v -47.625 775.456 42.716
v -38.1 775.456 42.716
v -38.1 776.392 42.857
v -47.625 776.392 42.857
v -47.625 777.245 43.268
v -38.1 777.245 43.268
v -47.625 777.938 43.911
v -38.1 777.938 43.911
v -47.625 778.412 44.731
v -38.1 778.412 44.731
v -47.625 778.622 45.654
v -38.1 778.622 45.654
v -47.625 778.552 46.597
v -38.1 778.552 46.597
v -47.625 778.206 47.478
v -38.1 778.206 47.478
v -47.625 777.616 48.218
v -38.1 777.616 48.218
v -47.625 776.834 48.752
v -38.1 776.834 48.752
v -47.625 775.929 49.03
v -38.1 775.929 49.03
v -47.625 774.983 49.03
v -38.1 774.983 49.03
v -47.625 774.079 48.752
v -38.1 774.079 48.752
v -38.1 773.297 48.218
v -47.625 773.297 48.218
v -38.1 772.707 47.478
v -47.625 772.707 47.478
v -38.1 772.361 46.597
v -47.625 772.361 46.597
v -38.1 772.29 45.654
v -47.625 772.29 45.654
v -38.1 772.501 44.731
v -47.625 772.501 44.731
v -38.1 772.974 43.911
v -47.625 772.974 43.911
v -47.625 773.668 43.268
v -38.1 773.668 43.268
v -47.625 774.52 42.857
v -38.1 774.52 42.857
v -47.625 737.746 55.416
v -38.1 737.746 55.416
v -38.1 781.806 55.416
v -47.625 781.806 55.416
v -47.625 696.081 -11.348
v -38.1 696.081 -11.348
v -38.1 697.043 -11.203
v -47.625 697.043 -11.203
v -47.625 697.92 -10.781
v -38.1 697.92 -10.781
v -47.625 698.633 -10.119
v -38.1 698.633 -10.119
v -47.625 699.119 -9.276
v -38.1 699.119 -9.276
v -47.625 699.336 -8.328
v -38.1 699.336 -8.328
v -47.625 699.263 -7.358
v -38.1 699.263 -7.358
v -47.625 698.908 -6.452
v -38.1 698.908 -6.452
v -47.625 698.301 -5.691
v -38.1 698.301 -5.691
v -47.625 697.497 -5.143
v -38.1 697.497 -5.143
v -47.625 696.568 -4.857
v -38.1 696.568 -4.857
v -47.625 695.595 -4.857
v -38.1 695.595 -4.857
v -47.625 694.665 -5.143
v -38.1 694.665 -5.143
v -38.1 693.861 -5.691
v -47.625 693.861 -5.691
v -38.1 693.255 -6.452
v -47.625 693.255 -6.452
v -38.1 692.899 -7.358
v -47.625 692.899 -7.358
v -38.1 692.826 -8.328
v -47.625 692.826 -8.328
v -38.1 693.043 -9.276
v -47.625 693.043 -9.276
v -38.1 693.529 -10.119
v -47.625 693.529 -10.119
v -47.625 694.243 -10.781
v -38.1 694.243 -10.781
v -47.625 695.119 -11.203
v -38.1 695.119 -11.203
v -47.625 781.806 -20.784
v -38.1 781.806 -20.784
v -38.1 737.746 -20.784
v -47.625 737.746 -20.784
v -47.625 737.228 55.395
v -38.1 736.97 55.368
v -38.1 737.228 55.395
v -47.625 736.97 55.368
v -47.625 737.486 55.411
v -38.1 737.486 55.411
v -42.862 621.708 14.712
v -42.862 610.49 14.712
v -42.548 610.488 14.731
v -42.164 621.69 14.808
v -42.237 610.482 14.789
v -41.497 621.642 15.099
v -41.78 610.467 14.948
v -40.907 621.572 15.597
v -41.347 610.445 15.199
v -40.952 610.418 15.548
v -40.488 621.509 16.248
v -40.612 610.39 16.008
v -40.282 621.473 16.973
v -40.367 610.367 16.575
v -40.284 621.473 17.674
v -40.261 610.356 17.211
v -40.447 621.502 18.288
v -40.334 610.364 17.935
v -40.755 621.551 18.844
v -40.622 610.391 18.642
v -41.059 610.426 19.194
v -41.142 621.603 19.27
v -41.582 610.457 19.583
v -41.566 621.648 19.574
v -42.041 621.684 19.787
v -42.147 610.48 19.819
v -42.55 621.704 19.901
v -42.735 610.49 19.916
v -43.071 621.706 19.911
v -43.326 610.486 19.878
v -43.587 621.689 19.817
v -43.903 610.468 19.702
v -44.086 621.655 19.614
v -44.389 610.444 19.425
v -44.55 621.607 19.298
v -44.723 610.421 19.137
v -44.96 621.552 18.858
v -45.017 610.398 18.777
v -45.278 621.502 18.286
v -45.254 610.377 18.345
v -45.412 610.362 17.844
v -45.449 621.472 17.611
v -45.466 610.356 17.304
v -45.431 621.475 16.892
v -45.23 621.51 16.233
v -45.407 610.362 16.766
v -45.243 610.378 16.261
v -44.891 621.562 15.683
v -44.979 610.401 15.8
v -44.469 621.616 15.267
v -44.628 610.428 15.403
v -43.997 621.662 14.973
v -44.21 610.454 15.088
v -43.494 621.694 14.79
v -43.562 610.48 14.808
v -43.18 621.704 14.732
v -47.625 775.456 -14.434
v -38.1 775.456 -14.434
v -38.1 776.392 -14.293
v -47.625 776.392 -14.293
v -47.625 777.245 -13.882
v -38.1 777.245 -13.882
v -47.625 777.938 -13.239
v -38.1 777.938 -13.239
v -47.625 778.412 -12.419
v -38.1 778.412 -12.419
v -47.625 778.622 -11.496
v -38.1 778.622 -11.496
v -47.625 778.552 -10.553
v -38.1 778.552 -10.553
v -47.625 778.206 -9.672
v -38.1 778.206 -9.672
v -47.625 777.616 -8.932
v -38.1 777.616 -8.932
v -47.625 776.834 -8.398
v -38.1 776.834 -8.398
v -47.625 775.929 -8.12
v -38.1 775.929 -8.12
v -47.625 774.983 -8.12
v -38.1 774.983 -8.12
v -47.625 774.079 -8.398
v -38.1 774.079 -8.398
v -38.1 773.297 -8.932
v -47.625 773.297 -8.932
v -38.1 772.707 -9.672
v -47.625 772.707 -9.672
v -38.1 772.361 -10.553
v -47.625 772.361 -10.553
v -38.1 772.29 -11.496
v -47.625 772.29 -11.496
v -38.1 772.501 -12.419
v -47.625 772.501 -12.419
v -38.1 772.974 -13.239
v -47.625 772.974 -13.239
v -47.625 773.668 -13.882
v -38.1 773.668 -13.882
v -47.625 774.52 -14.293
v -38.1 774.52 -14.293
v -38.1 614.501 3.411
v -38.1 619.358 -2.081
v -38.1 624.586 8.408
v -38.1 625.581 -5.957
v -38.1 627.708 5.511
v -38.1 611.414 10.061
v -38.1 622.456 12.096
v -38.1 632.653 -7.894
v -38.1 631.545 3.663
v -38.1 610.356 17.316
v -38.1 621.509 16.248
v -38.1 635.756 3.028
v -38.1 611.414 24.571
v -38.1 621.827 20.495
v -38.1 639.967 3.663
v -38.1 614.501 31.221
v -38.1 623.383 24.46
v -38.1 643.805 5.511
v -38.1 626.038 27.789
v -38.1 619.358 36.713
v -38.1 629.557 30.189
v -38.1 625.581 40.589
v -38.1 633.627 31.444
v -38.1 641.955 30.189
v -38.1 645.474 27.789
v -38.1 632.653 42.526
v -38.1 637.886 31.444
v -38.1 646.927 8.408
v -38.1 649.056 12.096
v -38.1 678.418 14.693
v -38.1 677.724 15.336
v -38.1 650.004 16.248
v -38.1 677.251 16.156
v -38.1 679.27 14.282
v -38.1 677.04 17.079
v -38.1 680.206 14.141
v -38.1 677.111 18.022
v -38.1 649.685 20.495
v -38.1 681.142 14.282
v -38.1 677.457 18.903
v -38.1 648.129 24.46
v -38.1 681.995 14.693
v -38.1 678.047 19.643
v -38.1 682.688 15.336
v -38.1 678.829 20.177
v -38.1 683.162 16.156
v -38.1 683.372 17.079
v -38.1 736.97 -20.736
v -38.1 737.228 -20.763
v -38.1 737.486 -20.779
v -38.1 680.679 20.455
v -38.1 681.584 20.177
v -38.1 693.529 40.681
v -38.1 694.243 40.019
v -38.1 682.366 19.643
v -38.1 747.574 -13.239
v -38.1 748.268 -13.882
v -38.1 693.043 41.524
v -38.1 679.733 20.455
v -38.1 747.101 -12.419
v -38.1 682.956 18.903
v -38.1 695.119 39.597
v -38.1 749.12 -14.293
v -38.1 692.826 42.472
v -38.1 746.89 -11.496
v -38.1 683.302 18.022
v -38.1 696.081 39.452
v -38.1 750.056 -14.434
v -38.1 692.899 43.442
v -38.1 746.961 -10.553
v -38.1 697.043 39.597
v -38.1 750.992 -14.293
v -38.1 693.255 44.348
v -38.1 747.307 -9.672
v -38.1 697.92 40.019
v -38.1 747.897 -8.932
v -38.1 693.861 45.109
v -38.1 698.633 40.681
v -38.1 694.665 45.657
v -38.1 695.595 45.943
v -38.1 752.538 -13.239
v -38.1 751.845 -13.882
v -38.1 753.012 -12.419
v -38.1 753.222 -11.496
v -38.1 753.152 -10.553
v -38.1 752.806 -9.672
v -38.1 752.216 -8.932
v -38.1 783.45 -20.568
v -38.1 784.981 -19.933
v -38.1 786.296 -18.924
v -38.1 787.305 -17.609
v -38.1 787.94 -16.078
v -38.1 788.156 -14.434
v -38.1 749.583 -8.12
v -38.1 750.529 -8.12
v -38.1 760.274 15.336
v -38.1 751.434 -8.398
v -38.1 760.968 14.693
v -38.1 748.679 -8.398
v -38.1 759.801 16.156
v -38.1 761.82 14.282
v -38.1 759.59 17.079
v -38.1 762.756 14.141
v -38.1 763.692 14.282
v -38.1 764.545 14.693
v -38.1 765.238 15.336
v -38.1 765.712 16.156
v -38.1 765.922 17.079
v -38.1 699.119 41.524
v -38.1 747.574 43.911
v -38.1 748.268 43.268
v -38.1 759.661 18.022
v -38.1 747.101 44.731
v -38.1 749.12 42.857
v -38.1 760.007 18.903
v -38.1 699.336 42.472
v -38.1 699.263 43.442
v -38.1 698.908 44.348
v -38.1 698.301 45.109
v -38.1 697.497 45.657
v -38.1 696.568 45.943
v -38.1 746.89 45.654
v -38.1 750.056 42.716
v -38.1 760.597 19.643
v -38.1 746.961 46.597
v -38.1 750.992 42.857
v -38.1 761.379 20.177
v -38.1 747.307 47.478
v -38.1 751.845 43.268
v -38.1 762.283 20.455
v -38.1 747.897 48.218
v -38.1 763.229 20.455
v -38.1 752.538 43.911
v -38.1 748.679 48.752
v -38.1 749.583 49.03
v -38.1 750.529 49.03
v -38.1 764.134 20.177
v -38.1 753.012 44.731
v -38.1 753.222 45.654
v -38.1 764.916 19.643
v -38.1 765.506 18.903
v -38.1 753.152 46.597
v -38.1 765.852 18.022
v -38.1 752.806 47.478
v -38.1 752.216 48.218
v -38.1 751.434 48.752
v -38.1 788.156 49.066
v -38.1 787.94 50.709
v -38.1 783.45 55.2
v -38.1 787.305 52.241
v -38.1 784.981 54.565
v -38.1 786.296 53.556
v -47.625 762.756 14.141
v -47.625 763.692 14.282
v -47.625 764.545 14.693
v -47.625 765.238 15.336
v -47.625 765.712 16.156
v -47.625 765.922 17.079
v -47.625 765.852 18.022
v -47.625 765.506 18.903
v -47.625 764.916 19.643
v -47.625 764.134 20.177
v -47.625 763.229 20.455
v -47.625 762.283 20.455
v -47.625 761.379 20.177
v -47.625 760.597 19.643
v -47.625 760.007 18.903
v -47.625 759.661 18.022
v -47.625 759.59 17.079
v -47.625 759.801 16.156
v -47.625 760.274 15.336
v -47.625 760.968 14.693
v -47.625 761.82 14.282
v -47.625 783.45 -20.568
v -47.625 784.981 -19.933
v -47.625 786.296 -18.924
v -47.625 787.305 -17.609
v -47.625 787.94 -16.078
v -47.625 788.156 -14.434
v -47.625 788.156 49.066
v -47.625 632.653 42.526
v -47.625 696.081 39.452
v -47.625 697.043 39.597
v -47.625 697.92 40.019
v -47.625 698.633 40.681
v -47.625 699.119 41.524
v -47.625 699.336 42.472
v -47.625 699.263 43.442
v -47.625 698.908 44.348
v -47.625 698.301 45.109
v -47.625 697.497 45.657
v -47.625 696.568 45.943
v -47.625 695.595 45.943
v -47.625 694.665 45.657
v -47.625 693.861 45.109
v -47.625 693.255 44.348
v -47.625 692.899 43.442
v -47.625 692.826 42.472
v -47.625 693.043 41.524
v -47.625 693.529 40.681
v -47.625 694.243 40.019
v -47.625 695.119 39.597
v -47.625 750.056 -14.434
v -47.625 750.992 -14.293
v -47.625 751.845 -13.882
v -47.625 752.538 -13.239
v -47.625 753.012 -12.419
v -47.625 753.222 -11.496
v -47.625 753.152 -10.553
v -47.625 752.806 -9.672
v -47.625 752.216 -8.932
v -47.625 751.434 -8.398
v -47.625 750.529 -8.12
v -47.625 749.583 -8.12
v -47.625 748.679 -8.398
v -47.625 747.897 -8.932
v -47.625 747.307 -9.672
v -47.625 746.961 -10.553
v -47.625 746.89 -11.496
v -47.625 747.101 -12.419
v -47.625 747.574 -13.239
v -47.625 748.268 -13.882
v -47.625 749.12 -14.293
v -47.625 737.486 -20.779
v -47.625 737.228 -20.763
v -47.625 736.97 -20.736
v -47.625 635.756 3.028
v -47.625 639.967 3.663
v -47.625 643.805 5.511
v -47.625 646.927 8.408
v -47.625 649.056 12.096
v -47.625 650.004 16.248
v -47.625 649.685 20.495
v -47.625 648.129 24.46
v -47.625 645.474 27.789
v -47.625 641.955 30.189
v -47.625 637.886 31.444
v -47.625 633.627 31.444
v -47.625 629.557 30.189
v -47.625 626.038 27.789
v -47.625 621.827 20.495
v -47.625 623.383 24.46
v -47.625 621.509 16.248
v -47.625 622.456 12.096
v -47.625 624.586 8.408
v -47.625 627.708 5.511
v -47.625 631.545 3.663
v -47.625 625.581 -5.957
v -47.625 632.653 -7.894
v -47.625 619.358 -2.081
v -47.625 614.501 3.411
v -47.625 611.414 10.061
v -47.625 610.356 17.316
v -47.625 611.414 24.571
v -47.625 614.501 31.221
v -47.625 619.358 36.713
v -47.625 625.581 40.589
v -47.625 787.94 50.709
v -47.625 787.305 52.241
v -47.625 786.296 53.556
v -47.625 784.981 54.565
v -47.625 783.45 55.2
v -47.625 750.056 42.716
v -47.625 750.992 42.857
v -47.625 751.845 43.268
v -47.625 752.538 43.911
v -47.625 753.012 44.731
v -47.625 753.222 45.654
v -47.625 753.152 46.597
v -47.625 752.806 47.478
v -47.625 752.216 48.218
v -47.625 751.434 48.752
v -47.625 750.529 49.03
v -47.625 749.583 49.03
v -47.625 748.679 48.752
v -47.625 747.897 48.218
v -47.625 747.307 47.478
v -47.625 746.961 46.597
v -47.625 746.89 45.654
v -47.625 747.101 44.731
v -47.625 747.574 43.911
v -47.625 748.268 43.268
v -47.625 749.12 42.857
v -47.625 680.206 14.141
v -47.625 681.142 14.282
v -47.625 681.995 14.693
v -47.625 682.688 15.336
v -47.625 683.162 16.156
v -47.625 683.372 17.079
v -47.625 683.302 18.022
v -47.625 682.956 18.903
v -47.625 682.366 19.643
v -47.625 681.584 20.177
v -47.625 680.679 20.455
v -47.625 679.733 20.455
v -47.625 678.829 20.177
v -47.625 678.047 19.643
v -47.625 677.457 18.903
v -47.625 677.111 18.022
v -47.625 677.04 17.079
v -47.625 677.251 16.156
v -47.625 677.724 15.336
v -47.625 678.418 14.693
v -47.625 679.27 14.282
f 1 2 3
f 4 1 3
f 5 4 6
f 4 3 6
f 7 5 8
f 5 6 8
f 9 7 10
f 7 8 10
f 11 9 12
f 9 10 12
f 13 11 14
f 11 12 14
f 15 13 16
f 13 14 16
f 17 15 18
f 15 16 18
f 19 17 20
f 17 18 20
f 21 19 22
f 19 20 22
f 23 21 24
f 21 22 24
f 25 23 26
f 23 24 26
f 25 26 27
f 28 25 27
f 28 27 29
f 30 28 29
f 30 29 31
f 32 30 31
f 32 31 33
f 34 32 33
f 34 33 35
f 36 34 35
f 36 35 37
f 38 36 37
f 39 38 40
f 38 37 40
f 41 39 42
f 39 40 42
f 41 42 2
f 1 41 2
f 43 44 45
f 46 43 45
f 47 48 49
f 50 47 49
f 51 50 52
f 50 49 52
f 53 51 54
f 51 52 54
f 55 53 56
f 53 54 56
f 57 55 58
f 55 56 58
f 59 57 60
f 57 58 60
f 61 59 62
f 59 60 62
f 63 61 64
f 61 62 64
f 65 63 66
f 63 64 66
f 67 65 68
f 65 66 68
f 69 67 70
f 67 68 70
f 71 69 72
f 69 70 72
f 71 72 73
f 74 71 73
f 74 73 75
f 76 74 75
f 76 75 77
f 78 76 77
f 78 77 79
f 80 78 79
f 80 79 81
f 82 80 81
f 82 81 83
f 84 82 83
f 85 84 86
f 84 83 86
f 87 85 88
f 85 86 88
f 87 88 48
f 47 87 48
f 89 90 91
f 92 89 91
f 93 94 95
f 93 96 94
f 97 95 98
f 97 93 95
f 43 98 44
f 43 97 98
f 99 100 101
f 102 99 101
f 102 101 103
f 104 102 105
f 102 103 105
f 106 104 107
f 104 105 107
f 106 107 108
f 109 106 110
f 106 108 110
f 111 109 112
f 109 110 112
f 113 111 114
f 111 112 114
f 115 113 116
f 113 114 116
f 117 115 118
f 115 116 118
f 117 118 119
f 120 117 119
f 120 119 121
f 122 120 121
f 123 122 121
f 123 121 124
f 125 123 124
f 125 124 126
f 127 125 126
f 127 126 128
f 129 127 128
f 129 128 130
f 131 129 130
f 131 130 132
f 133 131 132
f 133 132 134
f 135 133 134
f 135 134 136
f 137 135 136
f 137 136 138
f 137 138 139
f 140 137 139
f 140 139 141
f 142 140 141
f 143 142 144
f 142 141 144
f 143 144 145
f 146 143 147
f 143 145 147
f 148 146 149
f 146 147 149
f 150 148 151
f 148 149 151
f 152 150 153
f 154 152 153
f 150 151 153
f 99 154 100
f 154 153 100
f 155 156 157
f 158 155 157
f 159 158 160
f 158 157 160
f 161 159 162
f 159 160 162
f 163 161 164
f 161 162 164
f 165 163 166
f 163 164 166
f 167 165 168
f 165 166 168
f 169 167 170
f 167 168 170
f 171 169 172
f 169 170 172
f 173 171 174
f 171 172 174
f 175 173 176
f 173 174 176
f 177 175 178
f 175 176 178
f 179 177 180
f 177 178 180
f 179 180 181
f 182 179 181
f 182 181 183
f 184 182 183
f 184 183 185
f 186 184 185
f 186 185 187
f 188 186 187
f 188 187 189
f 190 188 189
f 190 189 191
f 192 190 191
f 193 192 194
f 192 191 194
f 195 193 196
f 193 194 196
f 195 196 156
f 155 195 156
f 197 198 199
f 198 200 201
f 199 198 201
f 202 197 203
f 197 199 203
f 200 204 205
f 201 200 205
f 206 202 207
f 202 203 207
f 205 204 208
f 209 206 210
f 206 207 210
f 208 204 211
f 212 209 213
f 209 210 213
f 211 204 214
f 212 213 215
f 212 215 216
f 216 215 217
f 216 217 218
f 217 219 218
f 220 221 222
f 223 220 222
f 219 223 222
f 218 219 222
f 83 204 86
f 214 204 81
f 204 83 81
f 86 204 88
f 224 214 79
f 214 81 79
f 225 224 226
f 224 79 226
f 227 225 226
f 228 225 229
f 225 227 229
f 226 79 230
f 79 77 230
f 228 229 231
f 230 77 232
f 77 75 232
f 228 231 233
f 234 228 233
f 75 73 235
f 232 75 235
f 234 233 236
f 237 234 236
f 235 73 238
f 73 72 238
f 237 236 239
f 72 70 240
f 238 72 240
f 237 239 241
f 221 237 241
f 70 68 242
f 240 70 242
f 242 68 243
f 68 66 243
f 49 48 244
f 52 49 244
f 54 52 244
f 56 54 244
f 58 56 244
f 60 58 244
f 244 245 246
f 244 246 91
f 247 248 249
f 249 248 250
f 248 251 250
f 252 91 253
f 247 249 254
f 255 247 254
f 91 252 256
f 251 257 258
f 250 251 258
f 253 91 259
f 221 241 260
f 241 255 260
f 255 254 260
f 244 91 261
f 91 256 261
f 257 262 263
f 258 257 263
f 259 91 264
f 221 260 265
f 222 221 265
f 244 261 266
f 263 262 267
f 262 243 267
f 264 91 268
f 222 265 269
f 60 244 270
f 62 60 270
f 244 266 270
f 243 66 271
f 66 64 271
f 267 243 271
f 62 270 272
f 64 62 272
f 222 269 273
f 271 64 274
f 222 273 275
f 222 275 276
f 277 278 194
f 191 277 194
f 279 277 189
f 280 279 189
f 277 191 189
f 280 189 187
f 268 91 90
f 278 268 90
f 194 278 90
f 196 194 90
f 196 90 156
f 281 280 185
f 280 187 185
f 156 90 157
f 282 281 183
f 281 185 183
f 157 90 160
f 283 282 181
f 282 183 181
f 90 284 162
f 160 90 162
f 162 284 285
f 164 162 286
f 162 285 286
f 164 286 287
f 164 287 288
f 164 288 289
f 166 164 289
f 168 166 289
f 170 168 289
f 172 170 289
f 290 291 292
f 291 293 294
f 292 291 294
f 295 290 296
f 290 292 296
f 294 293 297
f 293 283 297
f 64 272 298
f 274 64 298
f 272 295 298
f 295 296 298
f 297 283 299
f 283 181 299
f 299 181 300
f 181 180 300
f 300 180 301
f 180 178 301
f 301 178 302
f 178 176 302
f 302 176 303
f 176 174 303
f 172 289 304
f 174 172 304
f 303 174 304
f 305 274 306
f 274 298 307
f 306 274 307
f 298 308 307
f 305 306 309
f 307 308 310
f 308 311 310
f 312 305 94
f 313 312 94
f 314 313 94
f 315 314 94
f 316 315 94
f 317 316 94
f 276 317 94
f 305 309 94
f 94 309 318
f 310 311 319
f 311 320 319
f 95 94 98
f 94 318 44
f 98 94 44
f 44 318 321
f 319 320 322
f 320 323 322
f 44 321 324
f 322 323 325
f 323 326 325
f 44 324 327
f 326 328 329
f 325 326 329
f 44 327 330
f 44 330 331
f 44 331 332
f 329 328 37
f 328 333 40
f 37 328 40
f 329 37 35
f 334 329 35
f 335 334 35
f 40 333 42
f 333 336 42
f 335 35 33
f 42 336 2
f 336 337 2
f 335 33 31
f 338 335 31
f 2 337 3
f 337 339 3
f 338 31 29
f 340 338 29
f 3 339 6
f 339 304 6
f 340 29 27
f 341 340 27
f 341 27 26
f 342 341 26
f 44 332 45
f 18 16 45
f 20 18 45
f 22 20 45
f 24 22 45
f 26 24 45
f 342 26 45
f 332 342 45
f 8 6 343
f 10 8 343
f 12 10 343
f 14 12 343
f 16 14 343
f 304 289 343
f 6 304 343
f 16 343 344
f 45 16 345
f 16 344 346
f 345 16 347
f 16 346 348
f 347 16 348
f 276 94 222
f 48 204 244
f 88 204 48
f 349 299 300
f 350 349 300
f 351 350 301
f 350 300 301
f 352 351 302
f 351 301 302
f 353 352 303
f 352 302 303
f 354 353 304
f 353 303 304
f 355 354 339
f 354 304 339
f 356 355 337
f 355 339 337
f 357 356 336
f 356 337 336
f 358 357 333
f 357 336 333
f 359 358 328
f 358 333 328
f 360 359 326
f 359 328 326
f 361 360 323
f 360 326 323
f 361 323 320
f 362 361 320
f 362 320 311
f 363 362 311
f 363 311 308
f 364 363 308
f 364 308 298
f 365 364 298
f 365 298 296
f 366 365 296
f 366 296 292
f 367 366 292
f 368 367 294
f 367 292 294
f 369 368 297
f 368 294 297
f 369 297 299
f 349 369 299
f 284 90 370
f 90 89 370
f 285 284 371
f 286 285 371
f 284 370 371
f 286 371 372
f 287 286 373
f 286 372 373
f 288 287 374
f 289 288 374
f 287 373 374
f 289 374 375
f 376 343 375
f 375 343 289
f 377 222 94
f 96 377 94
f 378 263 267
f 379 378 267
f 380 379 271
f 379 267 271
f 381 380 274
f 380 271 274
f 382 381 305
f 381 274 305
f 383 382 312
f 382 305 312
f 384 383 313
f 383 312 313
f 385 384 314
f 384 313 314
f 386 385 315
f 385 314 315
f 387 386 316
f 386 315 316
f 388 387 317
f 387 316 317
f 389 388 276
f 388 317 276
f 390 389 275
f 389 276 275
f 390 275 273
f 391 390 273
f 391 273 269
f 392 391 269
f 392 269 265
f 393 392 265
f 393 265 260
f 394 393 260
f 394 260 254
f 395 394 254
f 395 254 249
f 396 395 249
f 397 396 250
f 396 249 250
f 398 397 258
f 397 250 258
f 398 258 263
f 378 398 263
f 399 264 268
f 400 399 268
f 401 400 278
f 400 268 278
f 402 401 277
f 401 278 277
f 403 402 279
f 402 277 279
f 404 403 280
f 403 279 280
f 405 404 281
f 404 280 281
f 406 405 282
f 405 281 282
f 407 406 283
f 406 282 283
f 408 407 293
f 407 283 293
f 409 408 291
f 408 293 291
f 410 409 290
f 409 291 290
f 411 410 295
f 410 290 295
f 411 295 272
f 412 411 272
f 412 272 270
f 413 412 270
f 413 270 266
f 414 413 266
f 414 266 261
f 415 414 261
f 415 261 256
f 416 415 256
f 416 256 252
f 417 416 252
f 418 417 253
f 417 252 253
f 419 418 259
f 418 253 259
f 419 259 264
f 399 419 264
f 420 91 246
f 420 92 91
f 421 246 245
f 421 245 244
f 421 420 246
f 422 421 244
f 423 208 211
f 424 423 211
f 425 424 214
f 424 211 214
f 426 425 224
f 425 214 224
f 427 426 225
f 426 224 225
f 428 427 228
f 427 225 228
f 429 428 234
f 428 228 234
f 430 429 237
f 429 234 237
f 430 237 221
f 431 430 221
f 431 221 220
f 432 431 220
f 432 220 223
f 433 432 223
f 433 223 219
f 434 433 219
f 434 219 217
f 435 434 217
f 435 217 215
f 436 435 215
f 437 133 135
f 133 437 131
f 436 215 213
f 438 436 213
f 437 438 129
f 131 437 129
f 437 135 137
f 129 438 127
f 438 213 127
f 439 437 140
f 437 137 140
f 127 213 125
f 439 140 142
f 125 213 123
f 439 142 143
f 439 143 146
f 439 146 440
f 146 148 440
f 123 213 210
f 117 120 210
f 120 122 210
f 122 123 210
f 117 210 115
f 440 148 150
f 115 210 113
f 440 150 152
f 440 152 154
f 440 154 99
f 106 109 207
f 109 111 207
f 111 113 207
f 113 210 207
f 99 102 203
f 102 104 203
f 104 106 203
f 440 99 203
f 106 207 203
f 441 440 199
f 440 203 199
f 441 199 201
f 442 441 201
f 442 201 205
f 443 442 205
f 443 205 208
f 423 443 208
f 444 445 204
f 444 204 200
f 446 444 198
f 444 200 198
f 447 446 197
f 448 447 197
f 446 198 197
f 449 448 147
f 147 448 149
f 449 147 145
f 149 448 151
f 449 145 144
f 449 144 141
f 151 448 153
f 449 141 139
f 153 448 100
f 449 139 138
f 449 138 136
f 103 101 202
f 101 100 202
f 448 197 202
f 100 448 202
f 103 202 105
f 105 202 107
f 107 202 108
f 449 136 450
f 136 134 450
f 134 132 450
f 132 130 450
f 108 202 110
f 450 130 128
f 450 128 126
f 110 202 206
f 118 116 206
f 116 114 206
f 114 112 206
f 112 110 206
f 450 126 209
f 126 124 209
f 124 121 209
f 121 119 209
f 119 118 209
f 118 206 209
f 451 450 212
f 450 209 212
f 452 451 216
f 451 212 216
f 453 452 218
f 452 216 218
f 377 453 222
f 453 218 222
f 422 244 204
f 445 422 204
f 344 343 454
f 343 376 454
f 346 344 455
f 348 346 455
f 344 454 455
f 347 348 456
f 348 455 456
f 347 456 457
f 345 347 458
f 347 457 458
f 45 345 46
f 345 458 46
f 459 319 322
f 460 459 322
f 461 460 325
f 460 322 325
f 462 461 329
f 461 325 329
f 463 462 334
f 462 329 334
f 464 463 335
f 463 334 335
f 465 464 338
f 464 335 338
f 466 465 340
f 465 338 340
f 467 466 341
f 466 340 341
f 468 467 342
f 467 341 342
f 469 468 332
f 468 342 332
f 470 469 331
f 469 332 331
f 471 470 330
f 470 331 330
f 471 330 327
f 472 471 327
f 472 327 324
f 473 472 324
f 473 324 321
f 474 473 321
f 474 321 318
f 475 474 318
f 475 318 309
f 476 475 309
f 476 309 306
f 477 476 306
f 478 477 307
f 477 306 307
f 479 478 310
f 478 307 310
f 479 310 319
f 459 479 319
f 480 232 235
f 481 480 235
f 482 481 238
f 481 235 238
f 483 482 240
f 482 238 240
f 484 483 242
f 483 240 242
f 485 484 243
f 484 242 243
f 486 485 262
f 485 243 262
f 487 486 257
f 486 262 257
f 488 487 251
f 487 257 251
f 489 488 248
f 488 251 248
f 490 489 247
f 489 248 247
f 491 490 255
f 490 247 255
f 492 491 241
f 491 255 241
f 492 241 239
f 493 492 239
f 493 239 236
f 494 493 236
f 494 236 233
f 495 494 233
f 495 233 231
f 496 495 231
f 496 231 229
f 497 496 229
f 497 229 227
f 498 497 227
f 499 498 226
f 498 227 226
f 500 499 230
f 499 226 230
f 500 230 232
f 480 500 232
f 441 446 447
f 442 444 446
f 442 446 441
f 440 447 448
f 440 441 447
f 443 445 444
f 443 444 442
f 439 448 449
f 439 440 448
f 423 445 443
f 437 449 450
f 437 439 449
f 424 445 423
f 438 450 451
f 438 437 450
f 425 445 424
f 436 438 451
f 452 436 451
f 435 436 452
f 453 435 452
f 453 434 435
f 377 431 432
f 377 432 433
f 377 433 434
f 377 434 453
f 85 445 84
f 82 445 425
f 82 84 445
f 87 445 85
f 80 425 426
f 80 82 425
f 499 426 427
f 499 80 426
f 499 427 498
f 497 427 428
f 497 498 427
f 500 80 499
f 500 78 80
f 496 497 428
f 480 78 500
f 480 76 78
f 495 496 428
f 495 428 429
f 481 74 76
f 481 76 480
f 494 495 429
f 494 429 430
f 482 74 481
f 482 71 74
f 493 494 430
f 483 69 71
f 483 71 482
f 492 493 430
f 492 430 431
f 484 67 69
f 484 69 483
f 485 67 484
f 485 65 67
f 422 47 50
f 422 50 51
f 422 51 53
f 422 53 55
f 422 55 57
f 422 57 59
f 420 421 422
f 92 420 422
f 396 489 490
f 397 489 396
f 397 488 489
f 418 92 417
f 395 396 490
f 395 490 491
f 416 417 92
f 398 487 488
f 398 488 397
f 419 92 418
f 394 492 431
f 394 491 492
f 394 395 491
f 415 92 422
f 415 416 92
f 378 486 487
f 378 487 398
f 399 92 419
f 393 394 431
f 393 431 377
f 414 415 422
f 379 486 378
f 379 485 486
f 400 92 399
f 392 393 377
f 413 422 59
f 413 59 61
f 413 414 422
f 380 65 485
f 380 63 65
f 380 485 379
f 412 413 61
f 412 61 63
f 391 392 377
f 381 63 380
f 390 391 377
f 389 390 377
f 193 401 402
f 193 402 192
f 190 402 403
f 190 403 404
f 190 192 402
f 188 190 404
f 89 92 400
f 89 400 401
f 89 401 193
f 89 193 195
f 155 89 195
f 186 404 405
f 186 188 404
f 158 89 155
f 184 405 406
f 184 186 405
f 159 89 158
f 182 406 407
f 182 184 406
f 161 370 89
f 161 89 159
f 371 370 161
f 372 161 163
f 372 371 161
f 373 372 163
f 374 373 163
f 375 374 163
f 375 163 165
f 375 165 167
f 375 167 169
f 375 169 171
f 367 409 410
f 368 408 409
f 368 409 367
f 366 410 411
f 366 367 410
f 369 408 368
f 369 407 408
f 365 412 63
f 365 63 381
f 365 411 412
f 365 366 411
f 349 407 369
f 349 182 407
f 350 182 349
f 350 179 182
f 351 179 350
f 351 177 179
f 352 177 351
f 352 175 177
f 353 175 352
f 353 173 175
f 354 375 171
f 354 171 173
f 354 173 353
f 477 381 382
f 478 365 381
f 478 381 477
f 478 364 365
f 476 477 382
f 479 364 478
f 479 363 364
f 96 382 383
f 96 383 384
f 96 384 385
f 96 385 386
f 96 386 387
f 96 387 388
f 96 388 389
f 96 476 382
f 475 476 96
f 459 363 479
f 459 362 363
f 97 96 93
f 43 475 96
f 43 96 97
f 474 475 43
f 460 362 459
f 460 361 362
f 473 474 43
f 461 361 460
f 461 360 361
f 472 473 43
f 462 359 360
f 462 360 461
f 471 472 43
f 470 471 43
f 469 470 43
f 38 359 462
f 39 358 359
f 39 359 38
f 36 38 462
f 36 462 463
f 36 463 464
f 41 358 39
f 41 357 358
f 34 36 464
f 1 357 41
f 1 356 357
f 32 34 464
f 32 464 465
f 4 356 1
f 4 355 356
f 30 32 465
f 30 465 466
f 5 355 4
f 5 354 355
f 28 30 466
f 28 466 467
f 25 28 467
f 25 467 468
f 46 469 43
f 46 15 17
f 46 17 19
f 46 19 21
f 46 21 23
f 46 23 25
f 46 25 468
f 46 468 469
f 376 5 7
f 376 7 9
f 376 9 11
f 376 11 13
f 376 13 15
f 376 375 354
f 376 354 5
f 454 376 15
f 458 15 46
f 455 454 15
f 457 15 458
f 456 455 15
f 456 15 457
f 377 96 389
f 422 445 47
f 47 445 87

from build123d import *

# Parameters (mm, degrees)
BOSS_EXTRUDE1_START     = -38.1
SKETCH1_R               = 14.2875
SKETCH1_R_2             = 3.175
SKETCH1_R_3             = 3.2639
BOSS_EXTRUDE1_DEPTH     = 9.525
CUT_EXTRUDE1_REACH      = 194.229
CUT_EXTRUDE1_END_RADIUS = 14.2875
SKETCH2_R               = 2.6035
FILLET1_R               = 6.35


with BuildPart() as part:
    # Sketch1 → Boss-Extrude1 (new body)
    with BuildSketch(Plane(origin=(0, 0, 0), x_dir=(0, 0, -1), z_dir=(1, 0, 0)).offset(BOSS_EXTRUDE1_START)):
        with BuildLine():
            Line((-42.525623825, 632.652514423), (-55.415953018, 737.356140976))
            Line((-55.415953018, 737.356140976), (-55.415953018, 788.156140976))
            Line((-55.415953018, 788.156140976), (20.784046982, 788.156140976))
            Line((20.784046982, 788.156140976), (20.784046982, 737.356140976))
            Line((20.784046982, 737.356140976), (7.89371779, 632.652514423))
            ThreePointArc((7.89371779, 632.652514423), (-17.315953018, 610.356140976), (-42.525623825, 632.652514423))
        make_face()
        with Locations((-17.315953018, 635.756140976)):
            Circle(SKETCH1_R, mode=Mode.SUBTRACT)
        with Locations((-45.890953018, 775.456140976)):
            Circle(SKETCH1_R_2, mode=Mode.SUBTRACT)
        with Locations((-17.315953018, 762.756140976)):
            Circle(SKETCH1_R_2, mode=Mode.SUBTRACT)
        with Locations((-45.890953018, 750.056140976)):
            Circle(SKETCH1_R_2, mode=Mode.SUBTRACT)
        with Locations((11.259046982, 750.056140976)):
            Circle(SKETCH1_R_2, mode=Mode.SUBTRACT)
        with Locations((11.259046982, 775.456140976)):
            Circle(SKETCH1_R_2, mode=Mode.SUBTRACT)
        with Locations((8.084046982, 696.081140976)):
            Circle(SKETCH1_R_3, mode=Mode.SUBTRACT)
        with Locations((-17.315953018, 680.206140976)):
            Circle(SKETCH1_R_2, mode=Mode.SUBTRACT)
        with Locations((-42.715953018, 696.081140976)):
            Circle(SKETCH1_R_3, mode=Mode.SUBTRACT)
    extrude(amount=-BOSS_EXTRUDE1_DEPTH)

    # Cut-Extrude1: up to this cylinder (the profile starts outside it)
    cut_extrude1_end = Plane(origin=(-42.8625, 635.756140976, 17.315953018), z_dir=(1, 0, 0)) * Cylinder(CUT_EXTRUDE1_END_RADIUS, 418.033, mode=Mode.PRIVATE)
    # Sketch2 → Cut-Extrude1 (cut, up to the surface)
    with BuildSketch(Plane(origin=(0, 610.356140976, 0), x_dir=(-1, 0, 0), z_dir=(0, -1, 0)), mode=Mode.PRIVATE) as cut_extrude1_sk1:
        with Locations(Location((42.8625, -17.315953018, 0), (0, 0, 90))):
            Circle(SKETCH2_R)
    cut_extrude1_tool1 = extrude(cut_extrude1_sk1.sketch, amount=-CUT_EXTRUDE1_REACH, mode=Mode.PRIVATE) - cut_extrude1_end
    add(cut_extrude1_tool1.solids().sort_by_distance((-42.8625, 610.356141, 17.315953))[0], mode=Mode.SUBTRACT)

    # Fillet1
    fillet1_edges = [part.edges().sort_by_distance(p)[0] for p in [
        (-42.8625, 737.356140976, 55.415953018),
        (-42.8625, 788.156140976, 55.415953018),
        (-42.8625, 788.156140976, -20.784046982),
        (-42.8625, 737.356140976, -20.784046982),
    ]]
    fillet(fillet1_edges, radius=FILLET1_R)


solid = part.part
